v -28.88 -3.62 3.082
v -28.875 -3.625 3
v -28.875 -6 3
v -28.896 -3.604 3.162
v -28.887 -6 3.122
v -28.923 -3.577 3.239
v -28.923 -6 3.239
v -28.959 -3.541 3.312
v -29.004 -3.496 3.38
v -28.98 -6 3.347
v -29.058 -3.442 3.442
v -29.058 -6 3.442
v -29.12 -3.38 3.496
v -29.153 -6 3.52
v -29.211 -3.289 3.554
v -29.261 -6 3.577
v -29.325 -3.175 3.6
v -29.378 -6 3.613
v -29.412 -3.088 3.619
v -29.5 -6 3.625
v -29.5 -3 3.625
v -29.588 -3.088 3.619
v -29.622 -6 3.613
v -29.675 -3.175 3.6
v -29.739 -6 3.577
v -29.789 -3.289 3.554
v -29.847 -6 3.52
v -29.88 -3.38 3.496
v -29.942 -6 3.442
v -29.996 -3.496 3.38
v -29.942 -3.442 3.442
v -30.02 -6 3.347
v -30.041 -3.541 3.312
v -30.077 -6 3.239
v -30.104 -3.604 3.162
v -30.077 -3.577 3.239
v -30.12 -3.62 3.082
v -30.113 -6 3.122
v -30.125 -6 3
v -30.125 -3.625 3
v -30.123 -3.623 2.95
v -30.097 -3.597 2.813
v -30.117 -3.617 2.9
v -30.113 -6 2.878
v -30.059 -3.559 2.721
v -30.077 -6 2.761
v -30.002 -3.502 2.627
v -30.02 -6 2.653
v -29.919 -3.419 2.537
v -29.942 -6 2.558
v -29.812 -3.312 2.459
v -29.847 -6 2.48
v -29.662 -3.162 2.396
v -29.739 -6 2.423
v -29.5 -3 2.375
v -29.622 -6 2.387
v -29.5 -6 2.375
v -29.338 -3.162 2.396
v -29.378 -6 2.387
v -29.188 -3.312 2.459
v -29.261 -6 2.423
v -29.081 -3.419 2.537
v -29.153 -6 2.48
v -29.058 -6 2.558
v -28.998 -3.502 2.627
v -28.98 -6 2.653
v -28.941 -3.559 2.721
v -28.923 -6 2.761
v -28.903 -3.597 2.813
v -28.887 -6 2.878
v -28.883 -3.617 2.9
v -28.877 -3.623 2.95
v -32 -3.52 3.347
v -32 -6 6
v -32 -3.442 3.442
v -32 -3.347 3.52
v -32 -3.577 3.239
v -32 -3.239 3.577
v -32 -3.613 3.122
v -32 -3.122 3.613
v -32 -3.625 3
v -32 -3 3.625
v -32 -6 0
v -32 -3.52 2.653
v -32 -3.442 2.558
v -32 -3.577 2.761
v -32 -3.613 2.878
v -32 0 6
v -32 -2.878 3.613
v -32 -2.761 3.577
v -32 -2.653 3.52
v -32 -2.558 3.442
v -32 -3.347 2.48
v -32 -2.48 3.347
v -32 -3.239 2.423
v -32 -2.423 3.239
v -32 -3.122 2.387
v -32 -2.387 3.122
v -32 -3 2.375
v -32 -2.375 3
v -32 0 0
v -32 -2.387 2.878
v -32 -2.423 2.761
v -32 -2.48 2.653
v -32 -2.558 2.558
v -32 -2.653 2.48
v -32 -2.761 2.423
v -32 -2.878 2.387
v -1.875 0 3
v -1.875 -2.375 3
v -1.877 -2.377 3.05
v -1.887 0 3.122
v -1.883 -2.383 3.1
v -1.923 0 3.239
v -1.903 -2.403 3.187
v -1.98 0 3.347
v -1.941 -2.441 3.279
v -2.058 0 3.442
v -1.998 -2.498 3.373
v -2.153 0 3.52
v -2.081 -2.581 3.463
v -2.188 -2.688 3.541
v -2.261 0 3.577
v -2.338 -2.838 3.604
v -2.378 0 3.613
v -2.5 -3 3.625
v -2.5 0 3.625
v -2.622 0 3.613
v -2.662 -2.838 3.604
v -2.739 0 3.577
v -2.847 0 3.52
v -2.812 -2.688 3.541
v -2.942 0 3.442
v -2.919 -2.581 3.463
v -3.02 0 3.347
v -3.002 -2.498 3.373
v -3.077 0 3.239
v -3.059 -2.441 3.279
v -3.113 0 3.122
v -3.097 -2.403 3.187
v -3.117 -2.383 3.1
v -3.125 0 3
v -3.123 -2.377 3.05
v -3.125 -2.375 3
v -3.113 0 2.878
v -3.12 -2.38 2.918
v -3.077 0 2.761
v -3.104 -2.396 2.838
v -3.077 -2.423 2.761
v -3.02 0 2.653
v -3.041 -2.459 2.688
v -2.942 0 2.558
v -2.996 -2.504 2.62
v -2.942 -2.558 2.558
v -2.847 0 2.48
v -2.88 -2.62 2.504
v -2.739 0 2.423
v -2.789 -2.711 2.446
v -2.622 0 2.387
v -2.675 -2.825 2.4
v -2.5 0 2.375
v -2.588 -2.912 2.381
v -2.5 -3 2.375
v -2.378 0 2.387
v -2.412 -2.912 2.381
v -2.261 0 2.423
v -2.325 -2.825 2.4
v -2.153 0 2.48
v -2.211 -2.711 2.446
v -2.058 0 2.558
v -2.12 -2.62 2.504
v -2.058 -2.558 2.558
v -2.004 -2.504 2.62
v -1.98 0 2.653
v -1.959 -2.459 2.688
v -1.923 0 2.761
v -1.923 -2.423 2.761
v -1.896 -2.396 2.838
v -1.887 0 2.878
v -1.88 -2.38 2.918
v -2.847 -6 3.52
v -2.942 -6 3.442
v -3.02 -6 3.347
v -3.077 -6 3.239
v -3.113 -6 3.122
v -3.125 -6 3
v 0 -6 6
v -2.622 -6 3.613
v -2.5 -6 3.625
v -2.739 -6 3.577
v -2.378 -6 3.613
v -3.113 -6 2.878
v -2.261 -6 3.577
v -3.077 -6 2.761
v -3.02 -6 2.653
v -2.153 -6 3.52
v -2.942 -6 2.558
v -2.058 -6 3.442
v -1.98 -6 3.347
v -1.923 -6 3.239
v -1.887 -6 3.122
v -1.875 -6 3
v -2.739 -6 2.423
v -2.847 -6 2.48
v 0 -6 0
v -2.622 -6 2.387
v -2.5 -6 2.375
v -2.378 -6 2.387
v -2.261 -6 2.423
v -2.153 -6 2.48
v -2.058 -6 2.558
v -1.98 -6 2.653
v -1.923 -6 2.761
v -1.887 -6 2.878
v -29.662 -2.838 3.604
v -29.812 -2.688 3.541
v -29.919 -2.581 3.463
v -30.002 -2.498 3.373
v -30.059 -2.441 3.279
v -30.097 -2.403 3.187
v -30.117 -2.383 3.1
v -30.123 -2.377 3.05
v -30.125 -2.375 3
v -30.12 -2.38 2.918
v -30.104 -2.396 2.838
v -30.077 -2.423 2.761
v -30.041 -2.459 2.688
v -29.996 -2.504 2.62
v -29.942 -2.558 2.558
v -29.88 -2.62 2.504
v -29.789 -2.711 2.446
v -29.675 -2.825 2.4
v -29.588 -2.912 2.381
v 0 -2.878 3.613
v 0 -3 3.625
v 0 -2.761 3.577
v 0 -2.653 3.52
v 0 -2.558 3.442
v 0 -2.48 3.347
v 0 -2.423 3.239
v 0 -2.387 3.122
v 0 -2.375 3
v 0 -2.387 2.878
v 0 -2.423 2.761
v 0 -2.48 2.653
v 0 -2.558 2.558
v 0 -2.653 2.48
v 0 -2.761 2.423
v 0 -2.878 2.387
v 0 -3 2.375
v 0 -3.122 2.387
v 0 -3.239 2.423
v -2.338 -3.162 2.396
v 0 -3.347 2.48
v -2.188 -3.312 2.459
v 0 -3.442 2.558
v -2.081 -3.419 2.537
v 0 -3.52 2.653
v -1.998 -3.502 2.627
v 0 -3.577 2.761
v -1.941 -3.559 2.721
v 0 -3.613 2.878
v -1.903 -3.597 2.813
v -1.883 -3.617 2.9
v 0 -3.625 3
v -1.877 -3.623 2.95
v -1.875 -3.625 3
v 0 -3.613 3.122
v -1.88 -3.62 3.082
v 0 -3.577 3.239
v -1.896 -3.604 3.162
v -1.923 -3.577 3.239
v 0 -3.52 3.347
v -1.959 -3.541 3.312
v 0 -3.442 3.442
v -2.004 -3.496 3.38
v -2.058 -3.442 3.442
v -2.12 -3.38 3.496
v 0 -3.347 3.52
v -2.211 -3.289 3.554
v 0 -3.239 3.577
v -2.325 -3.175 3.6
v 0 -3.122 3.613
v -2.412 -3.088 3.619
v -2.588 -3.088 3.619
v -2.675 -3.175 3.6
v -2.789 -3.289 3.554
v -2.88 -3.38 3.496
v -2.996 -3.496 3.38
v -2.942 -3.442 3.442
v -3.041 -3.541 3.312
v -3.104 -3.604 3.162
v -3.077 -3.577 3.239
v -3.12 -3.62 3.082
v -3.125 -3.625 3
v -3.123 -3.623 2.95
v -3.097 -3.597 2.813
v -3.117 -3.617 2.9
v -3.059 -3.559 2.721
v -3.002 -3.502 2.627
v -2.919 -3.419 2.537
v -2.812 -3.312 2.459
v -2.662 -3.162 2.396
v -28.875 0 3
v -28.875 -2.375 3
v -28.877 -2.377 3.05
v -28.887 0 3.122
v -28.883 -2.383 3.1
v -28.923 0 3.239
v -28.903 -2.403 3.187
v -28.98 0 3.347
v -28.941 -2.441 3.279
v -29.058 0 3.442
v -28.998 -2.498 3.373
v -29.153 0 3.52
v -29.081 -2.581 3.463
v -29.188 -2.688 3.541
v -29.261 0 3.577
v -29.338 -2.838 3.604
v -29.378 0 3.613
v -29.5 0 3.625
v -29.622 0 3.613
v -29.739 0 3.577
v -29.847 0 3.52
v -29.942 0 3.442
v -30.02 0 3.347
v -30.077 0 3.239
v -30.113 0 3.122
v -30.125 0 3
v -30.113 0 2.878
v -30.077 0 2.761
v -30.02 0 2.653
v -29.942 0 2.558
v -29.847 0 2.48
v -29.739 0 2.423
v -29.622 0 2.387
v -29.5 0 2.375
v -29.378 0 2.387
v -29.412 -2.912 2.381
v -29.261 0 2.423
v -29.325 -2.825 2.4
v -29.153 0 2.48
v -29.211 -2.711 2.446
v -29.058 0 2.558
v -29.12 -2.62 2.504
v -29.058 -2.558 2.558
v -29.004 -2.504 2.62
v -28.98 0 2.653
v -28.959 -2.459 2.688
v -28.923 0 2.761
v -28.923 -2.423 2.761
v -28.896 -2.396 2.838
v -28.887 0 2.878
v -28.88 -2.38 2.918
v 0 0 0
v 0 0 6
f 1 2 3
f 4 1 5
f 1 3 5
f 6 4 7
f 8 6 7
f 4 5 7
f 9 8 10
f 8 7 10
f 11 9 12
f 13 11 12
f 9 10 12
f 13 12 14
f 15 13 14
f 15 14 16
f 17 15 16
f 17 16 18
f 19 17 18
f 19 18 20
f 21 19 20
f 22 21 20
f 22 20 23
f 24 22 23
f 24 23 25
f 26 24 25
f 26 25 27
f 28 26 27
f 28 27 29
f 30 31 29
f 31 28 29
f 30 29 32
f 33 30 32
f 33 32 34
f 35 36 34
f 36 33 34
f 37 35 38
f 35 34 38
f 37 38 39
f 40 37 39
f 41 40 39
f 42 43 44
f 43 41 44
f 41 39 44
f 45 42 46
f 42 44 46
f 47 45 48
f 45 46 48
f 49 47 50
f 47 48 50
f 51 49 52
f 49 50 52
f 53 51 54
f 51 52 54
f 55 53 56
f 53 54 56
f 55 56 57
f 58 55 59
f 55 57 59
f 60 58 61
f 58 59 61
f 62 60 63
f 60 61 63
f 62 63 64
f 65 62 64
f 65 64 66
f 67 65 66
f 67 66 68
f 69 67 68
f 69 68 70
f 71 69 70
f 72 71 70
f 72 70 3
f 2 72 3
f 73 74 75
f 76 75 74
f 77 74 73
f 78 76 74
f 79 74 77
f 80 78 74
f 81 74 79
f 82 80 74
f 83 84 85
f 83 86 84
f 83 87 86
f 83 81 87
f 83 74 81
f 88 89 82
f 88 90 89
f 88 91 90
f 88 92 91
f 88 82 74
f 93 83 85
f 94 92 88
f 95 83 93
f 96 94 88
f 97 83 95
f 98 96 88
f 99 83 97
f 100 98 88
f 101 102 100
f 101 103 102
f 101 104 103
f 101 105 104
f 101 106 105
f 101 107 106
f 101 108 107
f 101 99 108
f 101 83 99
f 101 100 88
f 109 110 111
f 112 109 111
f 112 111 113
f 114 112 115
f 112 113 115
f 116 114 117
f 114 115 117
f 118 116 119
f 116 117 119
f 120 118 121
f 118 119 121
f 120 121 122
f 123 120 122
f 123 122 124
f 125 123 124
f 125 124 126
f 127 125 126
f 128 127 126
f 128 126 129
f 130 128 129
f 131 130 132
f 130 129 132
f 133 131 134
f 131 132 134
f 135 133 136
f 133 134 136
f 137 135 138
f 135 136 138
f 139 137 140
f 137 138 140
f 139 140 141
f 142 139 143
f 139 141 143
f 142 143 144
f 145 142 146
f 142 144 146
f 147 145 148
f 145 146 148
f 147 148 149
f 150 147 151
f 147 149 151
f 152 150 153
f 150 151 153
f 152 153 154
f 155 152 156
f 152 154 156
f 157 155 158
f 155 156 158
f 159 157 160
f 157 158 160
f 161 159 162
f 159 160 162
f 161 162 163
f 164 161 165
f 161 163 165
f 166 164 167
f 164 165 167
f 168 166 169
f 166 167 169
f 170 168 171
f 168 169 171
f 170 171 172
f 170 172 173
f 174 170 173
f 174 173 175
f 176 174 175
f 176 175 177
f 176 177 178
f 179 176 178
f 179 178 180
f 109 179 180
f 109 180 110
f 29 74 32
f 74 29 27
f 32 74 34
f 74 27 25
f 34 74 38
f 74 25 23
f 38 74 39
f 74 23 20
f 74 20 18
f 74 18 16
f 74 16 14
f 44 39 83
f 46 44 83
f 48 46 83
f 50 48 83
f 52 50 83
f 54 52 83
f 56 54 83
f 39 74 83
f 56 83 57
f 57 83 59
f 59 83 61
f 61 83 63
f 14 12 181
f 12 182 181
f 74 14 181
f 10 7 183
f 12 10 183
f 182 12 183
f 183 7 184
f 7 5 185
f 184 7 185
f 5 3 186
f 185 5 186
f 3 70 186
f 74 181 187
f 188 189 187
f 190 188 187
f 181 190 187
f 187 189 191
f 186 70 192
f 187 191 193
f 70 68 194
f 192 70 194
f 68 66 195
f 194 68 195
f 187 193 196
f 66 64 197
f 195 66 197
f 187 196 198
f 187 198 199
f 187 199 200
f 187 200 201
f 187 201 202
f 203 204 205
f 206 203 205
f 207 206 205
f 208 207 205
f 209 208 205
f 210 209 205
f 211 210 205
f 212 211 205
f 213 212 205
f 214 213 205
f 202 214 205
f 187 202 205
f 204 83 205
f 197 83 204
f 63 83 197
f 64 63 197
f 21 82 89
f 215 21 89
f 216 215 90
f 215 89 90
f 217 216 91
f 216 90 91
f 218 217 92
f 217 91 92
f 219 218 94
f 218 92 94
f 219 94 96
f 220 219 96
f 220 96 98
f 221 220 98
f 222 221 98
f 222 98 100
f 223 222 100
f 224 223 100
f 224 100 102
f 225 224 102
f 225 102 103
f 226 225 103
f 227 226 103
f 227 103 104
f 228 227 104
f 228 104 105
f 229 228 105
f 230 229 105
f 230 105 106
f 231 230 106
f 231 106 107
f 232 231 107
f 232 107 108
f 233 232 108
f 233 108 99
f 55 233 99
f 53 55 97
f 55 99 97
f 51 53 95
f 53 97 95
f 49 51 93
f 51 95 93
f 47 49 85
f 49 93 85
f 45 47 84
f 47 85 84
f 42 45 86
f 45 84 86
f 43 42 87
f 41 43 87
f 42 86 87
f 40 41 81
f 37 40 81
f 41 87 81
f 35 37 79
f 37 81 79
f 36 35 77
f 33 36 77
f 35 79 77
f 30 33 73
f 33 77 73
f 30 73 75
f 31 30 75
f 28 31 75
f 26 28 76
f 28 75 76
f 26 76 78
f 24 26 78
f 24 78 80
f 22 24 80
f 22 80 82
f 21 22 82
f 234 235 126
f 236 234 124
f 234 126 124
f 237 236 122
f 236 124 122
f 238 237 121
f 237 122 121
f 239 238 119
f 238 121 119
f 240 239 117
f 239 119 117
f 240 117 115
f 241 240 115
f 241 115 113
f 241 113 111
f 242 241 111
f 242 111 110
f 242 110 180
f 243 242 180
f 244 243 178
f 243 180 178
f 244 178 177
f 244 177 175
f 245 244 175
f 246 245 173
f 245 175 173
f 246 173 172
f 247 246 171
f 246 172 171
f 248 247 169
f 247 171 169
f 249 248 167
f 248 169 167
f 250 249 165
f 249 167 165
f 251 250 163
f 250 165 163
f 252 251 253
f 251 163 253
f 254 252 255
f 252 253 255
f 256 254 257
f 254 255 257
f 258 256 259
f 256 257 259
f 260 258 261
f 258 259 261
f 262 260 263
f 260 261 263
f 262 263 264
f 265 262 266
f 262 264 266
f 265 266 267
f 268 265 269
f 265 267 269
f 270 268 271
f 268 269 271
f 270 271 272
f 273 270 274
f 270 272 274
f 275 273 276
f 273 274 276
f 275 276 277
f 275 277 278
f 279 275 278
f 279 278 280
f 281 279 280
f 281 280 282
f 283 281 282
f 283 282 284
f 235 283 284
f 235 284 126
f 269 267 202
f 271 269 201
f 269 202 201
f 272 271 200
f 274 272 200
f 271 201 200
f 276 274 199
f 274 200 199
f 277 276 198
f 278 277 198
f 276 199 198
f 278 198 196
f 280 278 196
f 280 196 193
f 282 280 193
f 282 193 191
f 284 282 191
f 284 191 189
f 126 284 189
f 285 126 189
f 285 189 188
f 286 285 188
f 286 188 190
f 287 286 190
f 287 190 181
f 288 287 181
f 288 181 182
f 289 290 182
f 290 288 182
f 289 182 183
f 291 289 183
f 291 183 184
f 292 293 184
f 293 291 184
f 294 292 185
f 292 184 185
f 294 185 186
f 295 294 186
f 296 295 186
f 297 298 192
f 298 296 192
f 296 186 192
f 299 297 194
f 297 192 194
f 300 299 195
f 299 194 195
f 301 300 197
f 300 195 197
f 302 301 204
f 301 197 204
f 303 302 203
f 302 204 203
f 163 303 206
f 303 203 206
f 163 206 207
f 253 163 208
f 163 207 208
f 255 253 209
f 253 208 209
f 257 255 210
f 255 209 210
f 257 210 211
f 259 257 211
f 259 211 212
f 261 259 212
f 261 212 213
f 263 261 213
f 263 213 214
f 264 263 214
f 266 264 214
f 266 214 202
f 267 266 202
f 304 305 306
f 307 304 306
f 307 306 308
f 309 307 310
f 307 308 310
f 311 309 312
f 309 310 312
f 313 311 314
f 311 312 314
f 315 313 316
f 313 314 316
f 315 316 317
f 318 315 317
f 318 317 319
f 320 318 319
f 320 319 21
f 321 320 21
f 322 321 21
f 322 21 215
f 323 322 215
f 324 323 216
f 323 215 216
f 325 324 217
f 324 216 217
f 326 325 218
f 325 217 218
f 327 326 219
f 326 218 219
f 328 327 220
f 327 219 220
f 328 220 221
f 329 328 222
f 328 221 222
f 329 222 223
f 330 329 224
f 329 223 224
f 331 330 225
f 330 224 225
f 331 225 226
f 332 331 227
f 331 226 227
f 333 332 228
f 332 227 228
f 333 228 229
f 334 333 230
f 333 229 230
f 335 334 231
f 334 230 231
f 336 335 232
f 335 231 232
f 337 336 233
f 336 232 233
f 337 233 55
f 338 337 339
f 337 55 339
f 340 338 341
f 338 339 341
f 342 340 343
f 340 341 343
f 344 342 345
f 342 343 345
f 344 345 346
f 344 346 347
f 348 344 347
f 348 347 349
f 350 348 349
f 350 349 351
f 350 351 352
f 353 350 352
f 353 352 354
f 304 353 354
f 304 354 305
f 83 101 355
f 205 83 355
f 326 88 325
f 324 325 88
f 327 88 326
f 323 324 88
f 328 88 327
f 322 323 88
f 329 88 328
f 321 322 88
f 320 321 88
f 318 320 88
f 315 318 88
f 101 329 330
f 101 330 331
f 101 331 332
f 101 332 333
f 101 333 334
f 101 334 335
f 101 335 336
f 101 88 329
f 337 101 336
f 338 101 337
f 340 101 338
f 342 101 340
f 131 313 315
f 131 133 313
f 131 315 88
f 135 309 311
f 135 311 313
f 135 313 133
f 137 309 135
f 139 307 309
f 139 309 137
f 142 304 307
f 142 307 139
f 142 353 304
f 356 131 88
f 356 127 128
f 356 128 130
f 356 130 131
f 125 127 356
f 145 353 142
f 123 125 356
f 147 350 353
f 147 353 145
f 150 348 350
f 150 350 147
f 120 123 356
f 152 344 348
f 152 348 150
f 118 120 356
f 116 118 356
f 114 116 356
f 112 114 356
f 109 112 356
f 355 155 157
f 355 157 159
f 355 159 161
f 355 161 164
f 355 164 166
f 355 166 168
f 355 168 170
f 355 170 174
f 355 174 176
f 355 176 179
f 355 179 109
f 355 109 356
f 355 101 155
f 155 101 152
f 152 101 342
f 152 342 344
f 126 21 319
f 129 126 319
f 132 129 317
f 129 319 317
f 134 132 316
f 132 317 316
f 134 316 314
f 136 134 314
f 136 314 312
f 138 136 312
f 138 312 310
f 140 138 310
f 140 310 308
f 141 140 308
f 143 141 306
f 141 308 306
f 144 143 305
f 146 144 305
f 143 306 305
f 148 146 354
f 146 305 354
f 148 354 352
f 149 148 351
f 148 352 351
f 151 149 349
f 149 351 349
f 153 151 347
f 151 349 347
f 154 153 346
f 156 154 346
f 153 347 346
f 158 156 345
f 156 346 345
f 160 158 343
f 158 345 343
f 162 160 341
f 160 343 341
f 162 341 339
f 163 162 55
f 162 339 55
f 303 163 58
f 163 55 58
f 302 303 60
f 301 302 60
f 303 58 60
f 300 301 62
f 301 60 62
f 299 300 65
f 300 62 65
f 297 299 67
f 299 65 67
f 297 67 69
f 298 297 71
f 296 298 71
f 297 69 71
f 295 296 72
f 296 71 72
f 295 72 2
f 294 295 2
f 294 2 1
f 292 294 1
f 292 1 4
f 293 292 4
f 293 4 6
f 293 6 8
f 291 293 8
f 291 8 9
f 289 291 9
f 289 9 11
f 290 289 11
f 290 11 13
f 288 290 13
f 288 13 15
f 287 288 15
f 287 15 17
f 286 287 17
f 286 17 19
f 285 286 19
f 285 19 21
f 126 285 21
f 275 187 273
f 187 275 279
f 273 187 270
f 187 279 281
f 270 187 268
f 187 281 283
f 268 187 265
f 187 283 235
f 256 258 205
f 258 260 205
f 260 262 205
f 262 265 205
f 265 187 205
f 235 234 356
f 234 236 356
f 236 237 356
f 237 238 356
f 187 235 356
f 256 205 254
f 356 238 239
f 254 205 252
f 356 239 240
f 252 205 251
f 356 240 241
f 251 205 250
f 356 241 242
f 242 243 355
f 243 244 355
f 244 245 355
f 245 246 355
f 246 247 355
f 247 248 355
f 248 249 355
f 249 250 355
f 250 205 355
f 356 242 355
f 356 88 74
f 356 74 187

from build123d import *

# Parameters (mm, degrees)
ESQUISSE1_W             = 32
ESQUISSE1_H             = 6
BOSS_EXTRU_1_DEPTH      = 6
ESQUISSE2_R             = 0.625
ENL_V_MAT_EXTRU_1_DEPTH = 34.105890714
ESQUISSE3_R             = 0.625
ENL_V_MAT_EXTRU_2_DEPTH = 34.105890714


with BuildPart() as part:
    # Esquisse1 → Boss.-Extru.1 (new body)
    with BuildSketch(Plane.XY):
        with Locations((-16, -3)):
            Rectangle(ESQUISSE1_W, ESQUISSE1_H)
    extrude(amount=BOSS_EXTRU_1_DEPTH)

    # Esquisse2 → Enlèv. mat.-Extru.1 (cut, through all)
    with BuildSketch(Plane.ZY.offset(32)):
        with Locations((3, -3)):
            Circle(ESQUISSE2_R)
    extrude(amount=-ENL_V_MAT_EXTRU_1_DEPTH, mode=Mode.SUBTRACT)

    # Esquisse3 → Enlèv. mat.-Extru.2 (cut, through all)
    with BuildSketch(Plane.XZ.offset(6)):
        with Locations((-29.5, 3)):
            Circle(ESQUISSE3_R)
        with Locations((-2.5, 3)):
            Circle(ESQUISSE3_R)
    extrude(amount=-ENL_V_MAT_EXTRU_2_DEPTH, mode=Mode.SUBTRACT)


solid = part.part
